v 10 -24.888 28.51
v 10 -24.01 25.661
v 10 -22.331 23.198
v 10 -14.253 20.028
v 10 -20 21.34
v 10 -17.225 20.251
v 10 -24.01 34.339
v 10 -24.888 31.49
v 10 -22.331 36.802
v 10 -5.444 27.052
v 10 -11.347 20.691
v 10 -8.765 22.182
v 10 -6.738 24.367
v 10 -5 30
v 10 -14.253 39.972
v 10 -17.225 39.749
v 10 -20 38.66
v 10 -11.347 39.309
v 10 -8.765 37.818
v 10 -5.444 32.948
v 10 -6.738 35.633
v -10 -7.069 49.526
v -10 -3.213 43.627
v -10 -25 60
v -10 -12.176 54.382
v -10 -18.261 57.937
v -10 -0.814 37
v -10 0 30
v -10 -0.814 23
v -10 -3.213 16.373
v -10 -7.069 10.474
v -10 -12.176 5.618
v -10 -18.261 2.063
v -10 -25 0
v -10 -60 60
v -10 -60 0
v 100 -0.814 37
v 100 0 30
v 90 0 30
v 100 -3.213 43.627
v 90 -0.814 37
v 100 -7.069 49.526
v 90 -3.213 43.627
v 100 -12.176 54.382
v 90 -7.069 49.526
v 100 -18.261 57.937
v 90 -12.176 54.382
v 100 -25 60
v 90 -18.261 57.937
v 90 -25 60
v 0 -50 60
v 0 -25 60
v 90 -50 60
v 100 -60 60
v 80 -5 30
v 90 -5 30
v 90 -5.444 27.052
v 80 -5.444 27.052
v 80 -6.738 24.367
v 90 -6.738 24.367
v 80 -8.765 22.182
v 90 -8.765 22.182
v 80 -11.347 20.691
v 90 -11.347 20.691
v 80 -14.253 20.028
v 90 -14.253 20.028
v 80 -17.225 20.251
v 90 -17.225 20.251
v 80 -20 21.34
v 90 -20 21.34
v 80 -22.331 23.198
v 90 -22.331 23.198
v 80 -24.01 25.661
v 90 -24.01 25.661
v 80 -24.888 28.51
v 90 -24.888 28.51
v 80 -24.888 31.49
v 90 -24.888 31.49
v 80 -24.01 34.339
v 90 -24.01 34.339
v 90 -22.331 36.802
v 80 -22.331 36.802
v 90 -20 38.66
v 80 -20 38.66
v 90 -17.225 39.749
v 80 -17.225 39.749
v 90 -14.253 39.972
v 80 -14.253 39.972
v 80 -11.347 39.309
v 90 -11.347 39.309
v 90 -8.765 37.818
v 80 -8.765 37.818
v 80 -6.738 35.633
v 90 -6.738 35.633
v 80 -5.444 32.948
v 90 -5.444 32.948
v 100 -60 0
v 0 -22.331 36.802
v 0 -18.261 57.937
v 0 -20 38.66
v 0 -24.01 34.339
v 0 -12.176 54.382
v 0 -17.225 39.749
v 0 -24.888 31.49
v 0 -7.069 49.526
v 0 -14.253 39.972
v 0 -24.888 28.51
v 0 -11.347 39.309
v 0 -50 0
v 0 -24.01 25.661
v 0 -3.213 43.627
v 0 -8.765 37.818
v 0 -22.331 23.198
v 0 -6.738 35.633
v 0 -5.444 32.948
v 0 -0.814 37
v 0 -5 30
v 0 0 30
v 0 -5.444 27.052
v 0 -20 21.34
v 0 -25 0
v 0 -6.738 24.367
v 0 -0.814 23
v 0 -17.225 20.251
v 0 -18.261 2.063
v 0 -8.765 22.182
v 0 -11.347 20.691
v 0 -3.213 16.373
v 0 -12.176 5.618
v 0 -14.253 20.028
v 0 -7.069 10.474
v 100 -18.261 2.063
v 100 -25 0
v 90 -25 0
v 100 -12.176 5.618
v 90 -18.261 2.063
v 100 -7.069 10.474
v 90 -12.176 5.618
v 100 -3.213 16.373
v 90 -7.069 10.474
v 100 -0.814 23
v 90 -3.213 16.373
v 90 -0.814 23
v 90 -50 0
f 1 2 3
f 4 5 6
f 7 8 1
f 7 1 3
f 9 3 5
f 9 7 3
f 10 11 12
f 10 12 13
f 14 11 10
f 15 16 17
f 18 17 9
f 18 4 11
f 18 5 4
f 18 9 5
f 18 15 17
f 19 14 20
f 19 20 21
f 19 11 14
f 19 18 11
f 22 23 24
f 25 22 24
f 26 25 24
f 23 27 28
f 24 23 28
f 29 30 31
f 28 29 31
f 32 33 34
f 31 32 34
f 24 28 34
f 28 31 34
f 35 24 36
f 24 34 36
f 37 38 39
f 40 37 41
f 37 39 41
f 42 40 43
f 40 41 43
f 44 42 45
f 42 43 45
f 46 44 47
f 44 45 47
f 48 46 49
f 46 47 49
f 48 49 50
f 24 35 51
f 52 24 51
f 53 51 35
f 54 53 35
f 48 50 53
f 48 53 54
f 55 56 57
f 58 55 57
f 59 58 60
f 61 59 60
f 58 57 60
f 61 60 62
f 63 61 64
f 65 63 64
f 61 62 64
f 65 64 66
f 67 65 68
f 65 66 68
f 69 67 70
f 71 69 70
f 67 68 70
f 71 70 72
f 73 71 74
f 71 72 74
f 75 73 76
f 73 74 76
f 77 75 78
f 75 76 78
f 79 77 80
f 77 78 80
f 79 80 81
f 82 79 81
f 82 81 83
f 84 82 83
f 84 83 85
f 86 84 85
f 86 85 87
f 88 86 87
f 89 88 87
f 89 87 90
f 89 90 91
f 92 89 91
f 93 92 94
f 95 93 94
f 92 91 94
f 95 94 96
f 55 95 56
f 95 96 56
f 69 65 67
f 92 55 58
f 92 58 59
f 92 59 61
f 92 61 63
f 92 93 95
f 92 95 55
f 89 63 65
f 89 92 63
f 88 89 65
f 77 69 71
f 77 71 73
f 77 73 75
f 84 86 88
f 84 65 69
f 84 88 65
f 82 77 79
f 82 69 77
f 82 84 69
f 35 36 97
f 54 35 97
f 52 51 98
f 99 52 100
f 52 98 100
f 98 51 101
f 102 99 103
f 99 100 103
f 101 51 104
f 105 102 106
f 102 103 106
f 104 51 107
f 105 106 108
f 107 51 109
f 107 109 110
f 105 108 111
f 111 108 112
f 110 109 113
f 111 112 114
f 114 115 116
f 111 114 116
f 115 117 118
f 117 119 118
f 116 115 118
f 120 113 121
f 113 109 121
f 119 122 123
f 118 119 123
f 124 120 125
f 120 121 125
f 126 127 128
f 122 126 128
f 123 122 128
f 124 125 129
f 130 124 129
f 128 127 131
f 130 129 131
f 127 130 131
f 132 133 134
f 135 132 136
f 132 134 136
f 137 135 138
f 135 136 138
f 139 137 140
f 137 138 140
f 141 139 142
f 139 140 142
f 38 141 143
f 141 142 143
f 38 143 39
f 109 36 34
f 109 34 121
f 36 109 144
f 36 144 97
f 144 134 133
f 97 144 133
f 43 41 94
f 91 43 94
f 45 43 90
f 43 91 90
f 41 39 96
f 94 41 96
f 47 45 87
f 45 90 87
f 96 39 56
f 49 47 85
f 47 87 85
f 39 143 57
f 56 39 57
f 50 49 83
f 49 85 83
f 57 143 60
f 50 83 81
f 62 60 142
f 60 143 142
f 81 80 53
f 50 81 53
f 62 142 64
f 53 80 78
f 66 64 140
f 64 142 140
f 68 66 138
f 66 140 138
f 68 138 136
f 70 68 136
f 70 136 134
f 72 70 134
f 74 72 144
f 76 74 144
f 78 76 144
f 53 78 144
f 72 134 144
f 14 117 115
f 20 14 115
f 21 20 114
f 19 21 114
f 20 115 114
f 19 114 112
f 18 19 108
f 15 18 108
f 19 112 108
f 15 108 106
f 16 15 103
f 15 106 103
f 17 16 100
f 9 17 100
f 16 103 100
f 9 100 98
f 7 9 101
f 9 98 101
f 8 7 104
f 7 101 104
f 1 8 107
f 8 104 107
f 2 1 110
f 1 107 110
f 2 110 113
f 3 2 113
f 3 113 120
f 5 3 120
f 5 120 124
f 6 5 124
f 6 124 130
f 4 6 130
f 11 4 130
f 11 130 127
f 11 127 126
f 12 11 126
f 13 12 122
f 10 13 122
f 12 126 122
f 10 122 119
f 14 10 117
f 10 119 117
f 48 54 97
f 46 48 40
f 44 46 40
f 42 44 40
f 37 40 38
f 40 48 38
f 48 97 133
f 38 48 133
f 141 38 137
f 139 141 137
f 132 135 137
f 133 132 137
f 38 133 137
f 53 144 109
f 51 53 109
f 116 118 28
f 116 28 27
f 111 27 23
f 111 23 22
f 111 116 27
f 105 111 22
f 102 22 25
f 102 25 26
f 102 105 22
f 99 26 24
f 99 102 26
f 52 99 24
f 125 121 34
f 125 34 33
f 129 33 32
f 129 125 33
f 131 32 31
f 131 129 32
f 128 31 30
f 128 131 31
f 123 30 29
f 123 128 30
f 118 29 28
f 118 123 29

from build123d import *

# Parameters (mm, degrees)
F1_DEPTH = 60
F4_DEPTH = 10
F3_R     = 10
F5_DEPTH = 10
F6_DEPTH = 25
F7_DEPTH = 1000


with BuildPart() as f1:
    # F0 (on Top) → F1 (new body)
    with BuildSketch(Plane.XY):
        Polygon((0, -50), (0, 0), (-10, 0), (-10, -60), (100, -60), (100, 0), (90, 0), (90, -50), align=None)
    extrude(amount=F1_DEPTH)

    # F2 (on face) → F4 (join)
    with BuildSketch(Plane(origin=(90, 0, 0), x_dir=(0, -1, 0), z_dir=(-1, 0, 0))):
        with BuildLine():
            ThreePointArc((25, 30), (15, 40), (5, 30))
            ThreePointArc((5, 30), (15, 20), (25, 30))
        make_face()
    extrude(amount=F4_DEPTH)

    # F3 (on face) → F5 (join)
    with BuildSketch(Plane.YZ):
        with Locations((-15, 30)):
            Circle(F3_R)
    extrude(amount=F5_DEPTH)

    # F2 (on face) → F6 (cut)
    with BuildSketch(Plane(origin=(90, 0, 0), x_dir=(0, -1, 0), z_dir=(-1, 0, 0))):
        with BuildLine():
            Line((0, 60), (0, 30))
            ThreePointArc((0, 30), (7.0692509723, 49.5256241898), (25, 60))
            Line((25, 60), (0, 60))
        make_face()
        with BuildLine():
            Line((0, 30), (0, 0))
            Line((0, 0), (25, 0))
            ThreePointArc((25, 0), (7.0692509723, 10.4743758102), (0, 30))
        make_face()
    extrude(amount=-F6_DEPTH, mode=Mode.SUBTRACT)

    # F2 (on face) → F7 (cut)
    with BuildSketch(Plane(origin=(90, 0, 0), x_dir=(0, -1, 0), z_dir=(-1, 0, 0))):
        with BuildLine():
            Line((0, 60), (0, 30))
            ThreePointArc((0, 30), (7.0692509723, 49.5256241898), (25, 60))
            Line((25, 60), (0, 60))
        make_face()
        with BuildLine():
            Line((0, 30), (0, 0))
            Line((0, 0), (25, 0))
            ThreePointArc((25, 0), (7.0692509723, 10.4743758102), (0, 30))
        make_face()
    extrude(amount=F7_DEPTH, mode=Mode.SUBTRACT)


solid = f1.part
